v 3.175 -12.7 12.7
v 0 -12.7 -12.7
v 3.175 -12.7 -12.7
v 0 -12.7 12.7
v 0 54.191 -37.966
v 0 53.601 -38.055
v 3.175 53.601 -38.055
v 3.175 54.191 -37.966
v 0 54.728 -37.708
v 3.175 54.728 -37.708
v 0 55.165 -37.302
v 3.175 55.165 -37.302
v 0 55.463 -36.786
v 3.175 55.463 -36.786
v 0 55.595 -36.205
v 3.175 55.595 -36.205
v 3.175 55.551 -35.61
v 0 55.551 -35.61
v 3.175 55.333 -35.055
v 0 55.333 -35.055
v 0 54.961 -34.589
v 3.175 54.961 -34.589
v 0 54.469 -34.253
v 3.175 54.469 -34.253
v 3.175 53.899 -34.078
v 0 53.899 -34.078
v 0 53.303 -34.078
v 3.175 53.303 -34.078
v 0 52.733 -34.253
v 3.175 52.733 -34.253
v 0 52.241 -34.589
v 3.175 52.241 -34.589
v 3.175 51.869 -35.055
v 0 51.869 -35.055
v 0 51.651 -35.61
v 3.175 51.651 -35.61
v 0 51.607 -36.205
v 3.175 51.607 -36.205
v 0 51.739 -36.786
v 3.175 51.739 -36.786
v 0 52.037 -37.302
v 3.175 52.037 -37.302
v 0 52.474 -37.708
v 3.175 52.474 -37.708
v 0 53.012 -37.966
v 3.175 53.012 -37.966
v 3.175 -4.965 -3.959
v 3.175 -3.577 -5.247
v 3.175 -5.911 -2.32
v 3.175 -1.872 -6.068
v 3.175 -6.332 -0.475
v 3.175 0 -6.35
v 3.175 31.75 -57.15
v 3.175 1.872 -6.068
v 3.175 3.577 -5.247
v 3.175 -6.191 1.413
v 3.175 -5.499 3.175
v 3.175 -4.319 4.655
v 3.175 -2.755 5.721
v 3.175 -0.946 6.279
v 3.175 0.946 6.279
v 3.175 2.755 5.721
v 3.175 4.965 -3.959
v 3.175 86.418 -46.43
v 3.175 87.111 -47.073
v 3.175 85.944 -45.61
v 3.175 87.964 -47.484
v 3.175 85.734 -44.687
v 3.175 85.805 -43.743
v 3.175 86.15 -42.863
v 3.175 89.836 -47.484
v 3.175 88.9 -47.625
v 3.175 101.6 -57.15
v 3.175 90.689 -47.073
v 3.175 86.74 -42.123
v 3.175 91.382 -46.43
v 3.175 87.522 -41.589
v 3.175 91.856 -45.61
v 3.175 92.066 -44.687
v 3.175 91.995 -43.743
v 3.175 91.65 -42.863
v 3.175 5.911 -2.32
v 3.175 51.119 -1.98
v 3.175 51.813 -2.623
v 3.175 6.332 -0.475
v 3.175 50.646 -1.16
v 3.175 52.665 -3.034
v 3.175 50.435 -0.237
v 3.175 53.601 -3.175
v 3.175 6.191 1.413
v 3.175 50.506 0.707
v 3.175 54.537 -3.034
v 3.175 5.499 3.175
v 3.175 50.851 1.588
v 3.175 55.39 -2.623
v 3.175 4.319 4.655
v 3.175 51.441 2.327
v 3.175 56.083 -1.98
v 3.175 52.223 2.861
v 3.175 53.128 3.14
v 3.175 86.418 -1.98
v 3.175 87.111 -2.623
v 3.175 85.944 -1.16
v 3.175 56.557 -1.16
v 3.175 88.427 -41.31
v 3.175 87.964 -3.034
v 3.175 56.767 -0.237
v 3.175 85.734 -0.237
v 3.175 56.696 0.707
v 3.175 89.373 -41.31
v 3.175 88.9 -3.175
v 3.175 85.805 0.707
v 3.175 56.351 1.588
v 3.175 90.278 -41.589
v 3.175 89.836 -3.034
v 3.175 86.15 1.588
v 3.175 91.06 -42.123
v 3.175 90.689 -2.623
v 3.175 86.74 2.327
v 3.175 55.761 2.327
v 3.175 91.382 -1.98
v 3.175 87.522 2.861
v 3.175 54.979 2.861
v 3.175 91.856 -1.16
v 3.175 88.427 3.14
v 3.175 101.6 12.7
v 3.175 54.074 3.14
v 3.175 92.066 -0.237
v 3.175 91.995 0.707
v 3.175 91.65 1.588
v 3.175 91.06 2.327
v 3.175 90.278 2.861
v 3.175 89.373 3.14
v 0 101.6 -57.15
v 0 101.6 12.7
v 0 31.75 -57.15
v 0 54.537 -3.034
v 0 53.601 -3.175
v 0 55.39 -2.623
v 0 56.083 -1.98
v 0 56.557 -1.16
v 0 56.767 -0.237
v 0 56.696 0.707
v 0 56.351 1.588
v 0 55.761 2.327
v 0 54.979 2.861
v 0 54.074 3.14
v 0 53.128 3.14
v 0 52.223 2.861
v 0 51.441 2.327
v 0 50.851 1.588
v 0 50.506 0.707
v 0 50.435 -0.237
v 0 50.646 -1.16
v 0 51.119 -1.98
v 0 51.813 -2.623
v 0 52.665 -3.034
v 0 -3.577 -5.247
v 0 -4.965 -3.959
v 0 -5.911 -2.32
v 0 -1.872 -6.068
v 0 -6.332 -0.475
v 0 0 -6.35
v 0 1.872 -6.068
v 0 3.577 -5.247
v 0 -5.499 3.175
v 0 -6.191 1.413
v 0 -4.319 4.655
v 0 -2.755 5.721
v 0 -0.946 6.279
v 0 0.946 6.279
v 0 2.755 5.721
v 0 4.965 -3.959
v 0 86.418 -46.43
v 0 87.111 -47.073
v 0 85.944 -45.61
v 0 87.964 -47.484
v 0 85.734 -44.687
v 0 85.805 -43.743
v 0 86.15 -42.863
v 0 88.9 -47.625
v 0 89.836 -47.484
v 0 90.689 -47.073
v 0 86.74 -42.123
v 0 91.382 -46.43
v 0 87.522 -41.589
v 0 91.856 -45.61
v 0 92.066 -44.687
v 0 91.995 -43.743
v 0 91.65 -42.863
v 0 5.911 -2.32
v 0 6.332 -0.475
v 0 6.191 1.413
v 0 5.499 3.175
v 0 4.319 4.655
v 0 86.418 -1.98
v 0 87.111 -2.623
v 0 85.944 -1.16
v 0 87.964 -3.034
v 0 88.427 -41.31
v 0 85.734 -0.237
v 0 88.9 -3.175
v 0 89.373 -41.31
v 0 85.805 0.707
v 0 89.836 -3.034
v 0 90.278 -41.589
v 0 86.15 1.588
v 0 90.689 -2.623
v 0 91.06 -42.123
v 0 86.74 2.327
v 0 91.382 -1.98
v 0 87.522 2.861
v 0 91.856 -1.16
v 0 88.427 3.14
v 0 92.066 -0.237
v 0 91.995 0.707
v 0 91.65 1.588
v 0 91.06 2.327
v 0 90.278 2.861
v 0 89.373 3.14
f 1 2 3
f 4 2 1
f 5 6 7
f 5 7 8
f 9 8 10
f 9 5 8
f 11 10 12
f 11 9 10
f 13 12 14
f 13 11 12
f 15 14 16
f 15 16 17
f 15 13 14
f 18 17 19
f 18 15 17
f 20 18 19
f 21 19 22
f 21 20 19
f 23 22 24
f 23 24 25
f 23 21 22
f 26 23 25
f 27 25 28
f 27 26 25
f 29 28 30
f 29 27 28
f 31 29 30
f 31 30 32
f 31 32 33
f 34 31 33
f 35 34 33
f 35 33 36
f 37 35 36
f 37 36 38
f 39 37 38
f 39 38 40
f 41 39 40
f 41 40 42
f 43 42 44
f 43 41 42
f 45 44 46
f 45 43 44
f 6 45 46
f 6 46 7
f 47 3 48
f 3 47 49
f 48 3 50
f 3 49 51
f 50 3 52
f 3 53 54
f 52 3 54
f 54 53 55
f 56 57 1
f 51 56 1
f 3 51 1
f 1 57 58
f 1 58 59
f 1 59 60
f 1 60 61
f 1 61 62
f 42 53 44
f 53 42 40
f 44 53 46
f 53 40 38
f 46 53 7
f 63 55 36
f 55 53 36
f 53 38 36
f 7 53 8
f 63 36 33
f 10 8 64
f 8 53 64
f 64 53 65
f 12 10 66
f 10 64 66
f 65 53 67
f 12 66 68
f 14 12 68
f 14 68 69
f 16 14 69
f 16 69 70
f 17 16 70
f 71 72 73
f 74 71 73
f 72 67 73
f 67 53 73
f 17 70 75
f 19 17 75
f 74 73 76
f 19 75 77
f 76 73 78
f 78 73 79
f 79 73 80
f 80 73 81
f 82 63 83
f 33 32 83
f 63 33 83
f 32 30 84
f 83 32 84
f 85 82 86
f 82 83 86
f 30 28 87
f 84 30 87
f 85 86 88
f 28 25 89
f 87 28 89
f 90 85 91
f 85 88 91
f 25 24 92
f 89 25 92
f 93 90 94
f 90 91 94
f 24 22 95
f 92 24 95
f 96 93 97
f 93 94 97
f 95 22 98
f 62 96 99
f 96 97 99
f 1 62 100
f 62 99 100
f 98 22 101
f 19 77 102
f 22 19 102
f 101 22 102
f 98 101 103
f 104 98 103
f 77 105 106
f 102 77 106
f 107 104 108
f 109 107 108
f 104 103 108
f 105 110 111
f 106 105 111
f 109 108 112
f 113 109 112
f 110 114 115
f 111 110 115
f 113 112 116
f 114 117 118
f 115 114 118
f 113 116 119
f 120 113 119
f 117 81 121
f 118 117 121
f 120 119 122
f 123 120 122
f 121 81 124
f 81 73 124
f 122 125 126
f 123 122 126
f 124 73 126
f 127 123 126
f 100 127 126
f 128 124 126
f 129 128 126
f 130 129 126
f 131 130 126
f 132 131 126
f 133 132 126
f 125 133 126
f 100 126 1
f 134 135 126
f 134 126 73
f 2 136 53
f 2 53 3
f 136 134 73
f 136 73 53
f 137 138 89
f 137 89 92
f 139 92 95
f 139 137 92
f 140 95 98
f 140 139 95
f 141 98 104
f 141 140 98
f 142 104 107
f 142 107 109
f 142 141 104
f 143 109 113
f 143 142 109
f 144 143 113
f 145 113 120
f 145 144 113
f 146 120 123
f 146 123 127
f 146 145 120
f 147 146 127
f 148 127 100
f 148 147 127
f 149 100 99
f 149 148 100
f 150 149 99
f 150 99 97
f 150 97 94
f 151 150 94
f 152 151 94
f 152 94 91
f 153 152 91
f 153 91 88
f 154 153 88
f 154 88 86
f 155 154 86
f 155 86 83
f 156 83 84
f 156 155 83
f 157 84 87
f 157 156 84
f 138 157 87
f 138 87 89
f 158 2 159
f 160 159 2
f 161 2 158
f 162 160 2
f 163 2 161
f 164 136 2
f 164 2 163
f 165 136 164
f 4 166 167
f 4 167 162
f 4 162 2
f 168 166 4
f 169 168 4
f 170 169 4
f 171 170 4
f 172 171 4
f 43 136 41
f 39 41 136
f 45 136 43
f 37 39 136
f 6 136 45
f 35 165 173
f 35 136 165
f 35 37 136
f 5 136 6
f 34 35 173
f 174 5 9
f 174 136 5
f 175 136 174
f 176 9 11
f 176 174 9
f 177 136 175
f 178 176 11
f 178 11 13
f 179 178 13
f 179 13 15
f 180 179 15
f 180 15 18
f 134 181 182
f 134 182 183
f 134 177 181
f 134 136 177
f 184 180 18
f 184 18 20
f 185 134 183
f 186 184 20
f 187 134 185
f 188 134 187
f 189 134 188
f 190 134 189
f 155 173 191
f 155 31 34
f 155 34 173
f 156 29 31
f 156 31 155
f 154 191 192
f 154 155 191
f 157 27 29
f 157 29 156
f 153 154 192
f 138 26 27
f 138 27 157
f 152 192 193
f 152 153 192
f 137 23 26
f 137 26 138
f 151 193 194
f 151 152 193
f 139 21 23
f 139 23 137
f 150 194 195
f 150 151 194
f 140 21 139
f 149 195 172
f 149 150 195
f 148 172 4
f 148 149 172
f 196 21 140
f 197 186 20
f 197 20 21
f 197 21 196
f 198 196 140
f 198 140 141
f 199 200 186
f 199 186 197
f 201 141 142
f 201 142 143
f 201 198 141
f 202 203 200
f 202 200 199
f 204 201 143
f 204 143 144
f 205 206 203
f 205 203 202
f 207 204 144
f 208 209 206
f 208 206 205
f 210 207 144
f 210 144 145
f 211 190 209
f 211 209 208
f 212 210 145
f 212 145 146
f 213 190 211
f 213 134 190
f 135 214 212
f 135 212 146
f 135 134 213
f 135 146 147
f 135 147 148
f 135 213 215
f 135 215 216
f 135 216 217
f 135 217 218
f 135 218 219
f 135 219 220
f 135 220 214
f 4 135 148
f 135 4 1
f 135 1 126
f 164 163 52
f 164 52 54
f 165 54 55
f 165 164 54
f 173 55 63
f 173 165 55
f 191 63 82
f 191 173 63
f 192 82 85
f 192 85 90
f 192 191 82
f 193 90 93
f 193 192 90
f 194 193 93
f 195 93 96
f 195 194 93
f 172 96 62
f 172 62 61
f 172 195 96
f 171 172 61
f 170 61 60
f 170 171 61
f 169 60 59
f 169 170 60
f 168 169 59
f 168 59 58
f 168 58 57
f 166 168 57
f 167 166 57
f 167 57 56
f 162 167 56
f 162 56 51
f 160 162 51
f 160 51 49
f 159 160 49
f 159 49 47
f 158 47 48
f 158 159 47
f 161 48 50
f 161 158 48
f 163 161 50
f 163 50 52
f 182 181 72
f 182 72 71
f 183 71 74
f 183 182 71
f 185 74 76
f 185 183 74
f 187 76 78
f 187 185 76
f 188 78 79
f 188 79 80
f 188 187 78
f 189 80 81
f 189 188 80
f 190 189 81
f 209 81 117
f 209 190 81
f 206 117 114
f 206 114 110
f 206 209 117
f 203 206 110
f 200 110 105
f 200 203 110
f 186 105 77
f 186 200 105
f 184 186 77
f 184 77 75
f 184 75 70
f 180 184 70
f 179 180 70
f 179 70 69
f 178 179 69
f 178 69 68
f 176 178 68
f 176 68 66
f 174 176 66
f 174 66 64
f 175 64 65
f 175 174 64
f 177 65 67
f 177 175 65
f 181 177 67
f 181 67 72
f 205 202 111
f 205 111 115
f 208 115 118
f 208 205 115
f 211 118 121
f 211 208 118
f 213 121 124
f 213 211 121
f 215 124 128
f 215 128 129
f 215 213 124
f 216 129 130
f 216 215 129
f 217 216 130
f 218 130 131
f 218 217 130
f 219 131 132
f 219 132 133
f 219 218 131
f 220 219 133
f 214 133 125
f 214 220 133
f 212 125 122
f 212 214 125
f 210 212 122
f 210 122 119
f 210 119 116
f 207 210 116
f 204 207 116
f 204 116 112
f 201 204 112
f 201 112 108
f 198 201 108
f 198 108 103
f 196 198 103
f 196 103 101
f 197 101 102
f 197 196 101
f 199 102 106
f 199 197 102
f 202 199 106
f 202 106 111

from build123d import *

# Parameters (mm, degrees)
SKETCH1_R           = 2
SKETCH1_R_2         = 6.35
SKETCH1_R_3         = 3.175
BOSS_EXTRUDE1_DEPTH = 3.175


with BuildPart() as part:
    # Sketch1 → Boss-Extrude1 (new body)
    with BuildSketch(Plane(origin=(0, 0, 0), x_dir=(0, 0, -1), z_dir=(1, 0, 0))):
        Polygon((-12.7, 101.6), (57.15, 101.6), (57.15, 31.75), (12.7, -12.7), (-12.7, -12.7), align=None)
        with Locations((36.0553, 53.601042741)):
            Circle(SKETCH1_R, mode=Mode.SUBTRACT)
        Circle(SKETCH1_R_2, mode=Mode.SUBTRACT)
        with Locations((0, 88.9)):
            Circle(SKETCH1_R_3, mode=Mode.SUBTRACT)
        with Locations((44.45, 88.9)):
            Circle(SKETCH1_R_3, mode=Mode.SUBTRACT)
        with Locations((0, 53.601042741)):
            Circle(SKETCH1_R_3, mode=Mode.SUBTRACT)
    extrude(amount=BOSS_EXTRUDE1_DEPTH)


solid = part.part
